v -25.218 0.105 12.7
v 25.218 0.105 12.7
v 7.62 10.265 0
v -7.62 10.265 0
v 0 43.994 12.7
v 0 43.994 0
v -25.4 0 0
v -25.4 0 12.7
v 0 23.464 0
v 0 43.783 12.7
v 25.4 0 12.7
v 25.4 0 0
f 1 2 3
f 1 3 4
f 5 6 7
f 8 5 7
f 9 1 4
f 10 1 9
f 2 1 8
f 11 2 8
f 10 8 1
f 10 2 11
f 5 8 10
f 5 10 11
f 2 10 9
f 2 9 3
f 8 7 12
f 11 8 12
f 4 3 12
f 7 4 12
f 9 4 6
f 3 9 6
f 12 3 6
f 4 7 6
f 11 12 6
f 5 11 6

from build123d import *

# Parameters (mm, degrees)
F1_DEPTH = 12.7
F2_SIZE2 = 10.15999
F2_SIZE  = 12.69999


# Not quite as in the source:
# - a fillet or chamfer is up to 0.001 mm smaller than in the source, because OpenCascade refuses the exact size


with BuildPart() as f1:
    # F0 (on Top) → F1 (new body)
    with BuildSketch(Plane.XY):
        Polygon((0, 43.9940905122), (-25.4, 0), (-7.62, 10.2652877862), (0, 23.4635149399), align=None)
        Polygon((7.62, 10.2652877862), (25.4, 0), (0, 43.9940905122), (0, 23.4635149399), align=None)
        Polygon((-7.62, 10.2652877862), (-25.4, 0), (25.4, 0), (7.62, 10.2652877862), align=None)
    extrude(amount=F1_DEPTH)

    # F2 (size 12.7 and 10.16 in the source; OpenCascade refuses exactly that, so slightly less here)
    f2_edges = [f1.edges().sort_by_distance(p)[0] for p in [
        (0, 10.265288, 12.7),
        (-3.81, 16.864401, 12.7),
        (3.81, 16.864401, 12.7),
    ]]
    chamfer(f2_edges, length=F2_SIZE, length2=F2_SIZE2)


solid = f1.part
